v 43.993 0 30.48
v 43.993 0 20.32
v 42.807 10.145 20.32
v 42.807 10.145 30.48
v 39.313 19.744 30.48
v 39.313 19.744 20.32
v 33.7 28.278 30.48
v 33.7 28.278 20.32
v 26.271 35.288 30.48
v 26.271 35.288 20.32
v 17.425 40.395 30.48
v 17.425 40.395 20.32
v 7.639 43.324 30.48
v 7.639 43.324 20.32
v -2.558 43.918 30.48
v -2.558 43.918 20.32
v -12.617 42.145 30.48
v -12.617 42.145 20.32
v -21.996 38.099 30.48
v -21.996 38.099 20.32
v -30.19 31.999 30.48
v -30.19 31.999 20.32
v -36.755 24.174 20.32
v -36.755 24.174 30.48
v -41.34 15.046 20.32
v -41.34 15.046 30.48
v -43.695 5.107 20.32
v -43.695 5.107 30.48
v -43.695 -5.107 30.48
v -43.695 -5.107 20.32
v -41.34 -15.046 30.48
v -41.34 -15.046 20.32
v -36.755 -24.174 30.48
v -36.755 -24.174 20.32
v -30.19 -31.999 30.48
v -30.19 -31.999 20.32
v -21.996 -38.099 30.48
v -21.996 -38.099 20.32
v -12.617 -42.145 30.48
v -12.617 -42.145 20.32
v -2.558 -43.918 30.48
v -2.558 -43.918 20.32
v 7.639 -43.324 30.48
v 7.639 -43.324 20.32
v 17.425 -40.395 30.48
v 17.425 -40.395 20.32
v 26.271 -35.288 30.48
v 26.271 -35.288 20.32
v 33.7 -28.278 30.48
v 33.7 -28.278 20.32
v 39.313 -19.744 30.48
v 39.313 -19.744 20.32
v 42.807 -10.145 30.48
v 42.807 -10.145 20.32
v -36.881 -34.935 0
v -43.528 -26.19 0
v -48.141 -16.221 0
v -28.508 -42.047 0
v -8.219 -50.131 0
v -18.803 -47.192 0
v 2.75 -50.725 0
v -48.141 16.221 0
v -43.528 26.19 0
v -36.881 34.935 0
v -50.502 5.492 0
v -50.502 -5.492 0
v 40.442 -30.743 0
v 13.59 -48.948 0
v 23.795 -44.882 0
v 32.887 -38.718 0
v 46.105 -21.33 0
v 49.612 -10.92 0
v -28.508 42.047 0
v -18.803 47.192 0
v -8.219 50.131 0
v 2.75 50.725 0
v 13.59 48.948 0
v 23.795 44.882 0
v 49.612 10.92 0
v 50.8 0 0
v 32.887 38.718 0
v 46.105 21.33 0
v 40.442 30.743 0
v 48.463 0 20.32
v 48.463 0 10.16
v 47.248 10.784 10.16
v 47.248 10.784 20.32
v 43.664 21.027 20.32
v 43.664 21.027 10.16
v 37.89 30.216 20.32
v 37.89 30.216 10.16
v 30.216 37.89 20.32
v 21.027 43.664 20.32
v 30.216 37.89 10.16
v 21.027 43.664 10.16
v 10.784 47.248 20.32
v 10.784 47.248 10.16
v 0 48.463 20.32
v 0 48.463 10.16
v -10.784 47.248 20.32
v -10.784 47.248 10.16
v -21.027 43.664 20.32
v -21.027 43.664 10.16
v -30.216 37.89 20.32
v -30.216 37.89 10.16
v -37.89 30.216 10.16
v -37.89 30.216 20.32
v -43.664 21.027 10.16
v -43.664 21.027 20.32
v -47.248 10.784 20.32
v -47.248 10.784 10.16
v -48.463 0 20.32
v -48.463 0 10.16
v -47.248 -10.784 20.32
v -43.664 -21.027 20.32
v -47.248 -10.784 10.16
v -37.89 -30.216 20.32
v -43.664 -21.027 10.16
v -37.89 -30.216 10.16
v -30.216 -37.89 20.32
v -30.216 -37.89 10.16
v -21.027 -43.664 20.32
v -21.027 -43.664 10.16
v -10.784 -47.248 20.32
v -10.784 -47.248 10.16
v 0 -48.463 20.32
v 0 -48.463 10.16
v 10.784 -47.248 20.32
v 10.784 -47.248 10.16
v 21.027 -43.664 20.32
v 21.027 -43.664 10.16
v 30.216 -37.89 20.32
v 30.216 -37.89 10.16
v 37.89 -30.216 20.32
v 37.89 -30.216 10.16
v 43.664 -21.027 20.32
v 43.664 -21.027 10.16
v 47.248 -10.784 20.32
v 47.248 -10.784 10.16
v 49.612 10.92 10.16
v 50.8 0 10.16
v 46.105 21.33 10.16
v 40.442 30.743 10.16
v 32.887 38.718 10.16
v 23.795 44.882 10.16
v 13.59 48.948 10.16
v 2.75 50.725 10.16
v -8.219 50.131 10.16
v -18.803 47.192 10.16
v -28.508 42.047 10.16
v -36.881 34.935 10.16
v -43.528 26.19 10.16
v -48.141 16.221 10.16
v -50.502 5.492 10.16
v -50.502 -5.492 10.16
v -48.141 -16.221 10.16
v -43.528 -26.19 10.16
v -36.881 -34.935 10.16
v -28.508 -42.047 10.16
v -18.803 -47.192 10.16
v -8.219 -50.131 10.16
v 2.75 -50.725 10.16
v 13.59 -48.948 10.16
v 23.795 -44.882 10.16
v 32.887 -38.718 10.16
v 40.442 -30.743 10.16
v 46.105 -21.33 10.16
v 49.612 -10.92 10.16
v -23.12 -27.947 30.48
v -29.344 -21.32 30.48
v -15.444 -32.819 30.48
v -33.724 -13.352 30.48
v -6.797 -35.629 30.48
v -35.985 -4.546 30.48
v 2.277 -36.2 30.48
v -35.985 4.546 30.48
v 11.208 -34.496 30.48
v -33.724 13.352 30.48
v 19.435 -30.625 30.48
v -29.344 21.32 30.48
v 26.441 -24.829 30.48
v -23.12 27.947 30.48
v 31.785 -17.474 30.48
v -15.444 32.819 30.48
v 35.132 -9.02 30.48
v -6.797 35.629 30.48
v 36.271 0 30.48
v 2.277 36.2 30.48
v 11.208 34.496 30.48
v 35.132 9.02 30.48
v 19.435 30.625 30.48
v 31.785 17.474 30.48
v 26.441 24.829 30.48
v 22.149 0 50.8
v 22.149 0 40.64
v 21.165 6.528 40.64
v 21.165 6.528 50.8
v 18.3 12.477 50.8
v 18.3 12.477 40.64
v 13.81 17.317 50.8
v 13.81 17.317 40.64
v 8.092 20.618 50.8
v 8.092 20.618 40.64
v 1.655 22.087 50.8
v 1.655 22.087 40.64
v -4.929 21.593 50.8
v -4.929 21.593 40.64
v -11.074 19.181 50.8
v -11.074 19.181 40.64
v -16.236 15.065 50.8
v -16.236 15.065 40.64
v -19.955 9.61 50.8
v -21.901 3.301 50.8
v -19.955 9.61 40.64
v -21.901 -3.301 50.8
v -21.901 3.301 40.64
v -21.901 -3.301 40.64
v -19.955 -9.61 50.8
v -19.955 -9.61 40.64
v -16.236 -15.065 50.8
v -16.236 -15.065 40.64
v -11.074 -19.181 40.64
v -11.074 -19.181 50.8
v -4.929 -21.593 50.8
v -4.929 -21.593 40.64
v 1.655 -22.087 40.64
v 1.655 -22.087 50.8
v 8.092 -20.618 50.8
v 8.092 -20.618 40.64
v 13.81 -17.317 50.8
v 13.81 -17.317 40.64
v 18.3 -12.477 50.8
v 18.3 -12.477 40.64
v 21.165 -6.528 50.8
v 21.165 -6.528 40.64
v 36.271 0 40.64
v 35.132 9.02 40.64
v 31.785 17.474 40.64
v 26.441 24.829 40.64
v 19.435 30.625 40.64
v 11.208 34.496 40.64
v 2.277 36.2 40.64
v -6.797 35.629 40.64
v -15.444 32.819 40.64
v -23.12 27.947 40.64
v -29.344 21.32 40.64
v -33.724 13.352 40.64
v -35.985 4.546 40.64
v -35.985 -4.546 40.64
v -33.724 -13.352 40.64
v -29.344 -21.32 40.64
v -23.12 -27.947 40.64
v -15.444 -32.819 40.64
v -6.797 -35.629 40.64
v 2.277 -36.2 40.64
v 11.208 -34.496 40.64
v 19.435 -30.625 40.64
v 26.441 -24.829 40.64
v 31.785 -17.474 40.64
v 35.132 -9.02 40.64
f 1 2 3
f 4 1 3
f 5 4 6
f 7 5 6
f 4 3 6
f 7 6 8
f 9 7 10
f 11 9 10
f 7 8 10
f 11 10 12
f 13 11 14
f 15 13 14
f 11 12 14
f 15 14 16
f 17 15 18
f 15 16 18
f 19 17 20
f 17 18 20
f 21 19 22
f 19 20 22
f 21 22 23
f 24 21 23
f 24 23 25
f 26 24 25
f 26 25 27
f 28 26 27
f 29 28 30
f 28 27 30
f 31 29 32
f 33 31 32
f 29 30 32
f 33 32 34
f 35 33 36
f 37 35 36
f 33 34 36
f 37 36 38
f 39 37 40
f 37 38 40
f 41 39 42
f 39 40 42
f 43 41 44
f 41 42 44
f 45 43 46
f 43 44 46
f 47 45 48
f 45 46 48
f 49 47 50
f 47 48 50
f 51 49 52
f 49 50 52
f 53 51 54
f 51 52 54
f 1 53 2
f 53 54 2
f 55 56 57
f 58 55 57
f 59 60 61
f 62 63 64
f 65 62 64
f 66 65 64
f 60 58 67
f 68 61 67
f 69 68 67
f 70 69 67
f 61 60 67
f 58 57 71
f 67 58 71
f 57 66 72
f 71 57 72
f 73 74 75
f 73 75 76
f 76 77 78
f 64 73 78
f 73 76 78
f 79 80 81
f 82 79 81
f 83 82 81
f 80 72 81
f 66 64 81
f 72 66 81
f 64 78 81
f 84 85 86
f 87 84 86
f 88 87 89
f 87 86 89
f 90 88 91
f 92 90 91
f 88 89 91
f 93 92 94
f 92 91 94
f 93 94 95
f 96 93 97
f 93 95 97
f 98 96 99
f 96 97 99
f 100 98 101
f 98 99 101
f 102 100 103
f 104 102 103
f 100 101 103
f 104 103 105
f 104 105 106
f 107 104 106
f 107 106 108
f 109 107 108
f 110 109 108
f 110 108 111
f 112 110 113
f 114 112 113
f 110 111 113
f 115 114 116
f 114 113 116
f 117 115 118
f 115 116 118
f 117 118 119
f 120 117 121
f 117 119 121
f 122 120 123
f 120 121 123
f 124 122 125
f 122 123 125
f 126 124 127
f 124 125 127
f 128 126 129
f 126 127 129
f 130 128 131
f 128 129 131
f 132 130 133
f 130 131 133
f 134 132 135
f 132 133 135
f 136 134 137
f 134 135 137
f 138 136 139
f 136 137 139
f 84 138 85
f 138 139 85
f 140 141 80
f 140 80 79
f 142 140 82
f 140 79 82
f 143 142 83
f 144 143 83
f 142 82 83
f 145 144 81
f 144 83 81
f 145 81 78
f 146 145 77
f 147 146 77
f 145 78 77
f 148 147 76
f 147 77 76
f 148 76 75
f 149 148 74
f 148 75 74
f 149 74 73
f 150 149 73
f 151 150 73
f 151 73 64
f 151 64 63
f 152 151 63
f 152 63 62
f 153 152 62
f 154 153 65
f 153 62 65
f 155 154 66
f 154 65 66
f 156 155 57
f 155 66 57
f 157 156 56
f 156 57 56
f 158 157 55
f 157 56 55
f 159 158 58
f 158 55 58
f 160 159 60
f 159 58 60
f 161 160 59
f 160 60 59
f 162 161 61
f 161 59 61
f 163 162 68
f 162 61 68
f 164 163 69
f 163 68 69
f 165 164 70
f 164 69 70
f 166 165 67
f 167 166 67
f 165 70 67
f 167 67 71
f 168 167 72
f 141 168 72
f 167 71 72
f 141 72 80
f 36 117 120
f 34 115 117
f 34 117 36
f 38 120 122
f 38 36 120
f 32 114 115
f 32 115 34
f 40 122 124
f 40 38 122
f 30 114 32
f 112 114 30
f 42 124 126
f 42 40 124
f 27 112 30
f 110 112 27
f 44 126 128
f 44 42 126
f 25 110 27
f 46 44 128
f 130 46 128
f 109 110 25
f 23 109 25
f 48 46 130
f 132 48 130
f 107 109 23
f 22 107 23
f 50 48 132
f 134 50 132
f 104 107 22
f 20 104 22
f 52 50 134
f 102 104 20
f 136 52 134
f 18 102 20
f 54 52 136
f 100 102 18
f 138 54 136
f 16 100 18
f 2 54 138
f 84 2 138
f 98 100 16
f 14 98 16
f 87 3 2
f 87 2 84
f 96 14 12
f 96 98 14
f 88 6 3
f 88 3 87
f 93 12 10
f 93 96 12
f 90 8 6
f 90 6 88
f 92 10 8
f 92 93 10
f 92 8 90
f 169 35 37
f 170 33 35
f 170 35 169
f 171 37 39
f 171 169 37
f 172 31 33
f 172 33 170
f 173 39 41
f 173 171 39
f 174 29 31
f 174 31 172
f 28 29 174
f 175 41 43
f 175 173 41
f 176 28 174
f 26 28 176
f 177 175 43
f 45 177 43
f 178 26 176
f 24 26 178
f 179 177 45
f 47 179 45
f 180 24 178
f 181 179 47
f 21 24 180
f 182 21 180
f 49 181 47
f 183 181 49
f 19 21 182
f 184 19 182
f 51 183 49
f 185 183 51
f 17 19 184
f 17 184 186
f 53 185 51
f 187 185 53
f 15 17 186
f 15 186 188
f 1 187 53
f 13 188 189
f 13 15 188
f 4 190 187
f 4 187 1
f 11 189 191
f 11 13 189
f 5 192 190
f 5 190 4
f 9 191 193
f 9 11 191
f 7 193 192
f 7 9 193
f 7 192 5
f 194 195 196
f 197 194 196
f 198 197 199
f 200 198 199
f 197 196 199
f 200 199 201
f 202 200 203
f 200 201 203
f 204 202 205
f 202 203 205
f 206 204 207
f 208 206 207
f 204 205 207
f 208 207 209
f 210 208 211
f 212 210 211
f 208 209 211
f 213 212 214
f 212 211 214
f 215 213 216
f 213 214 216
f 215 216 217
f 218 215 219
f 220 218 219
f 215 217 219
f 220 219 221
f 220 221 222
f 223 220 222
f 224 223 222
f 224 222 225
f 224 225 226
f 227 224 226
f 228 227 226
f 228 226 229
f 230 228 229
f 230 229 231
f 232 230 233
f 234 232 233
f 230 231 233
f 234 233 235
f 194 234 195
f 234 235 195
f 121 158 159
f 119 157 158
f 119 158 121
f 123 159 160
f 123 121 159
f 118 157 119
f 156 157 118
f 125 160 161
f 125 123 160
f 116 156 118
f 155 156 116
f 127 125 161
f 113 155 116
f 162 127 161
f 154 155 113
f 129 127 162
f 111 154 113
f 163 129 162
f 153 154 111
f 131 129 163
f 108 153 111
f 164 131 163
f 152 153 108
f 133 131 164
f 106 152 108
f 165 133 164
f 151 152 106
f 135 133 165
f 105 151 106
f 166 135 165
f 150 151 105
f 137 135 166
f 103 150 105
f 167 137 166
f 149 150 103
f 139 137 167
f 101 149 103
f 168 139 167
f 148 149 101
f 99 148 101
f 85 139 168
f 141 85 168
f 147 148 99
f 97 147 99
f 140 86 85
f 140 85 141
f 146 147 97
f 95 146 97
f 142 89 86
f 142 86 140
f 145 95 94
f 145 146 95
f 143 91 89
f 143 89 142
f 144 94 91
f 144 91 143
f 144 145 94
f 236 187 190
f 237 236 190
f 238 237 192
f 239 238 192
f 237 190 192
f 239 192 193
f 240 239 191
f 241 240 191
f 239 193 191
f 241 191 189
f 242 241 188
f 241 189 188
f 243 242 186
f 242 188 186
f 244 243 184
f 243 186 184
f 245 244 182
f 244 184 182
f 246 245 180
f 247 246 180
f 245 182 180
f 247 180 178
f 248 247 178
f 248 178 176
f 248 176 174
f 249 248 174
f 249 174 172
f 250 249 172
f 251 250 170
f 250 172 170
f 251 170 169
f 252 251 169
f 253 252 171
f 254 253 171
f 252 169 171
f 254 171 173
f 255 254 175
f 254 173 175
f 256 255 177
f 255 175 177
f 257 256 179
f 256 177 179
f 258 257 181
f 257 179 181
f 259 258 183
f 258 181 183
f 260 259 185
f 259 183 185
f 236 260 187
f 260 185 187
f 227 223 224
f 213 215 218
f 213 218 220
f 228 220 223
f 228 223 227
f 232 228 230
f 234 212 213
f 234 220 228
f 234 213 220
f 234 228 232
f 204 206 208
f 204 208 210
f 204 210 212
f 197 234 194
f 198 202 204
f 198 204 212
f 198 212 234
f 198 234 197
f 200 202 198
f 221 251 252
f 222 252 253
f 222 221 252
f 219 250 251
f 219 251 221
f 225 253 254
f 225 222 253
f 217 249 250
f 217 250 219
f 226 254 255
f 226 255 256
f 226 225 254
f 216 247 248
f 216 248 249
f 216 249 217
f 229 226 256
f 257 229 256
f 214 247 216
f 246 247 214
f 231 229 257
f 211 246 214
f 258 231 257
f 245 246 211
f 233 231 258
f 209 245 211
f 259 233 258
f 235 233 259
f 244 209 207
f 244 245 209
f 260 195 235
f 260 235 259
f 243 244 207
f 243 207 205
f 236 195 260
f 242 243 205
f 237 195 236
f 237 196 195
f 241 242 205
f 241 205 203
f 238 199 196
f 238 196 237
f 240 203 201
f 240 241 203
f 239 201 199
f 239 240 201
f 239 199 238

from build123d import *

# Parameters (mm, degrees)
F0_R     = 50.8
F1_DEPTH = 10.16
F2_R     = 48.4632
F3_DEPTH = 10.16
F4_R     = 43.9928
F5_DEPTH = 10.16
F6_R     = 36.2712
F7_DEPTH = 10.16
F8_R     = 22.1488
F9_DEPTH = 10.16


with BuildPart() as f1:
    # F0 (on Top) → F1 (new body)
    with BuildSketch(Plane.XY):
        Circle(F0_R)
    extrude(amount=F1_DEPTH)

    # F2 (on face) → F3 (join)
    with BuildSketch(Plane.XY.offset(10.16)):
        Circle(F2_R)
    extrude(amount=F3_DEPTH)

    # F4 (on face) → F5 (join)
    with BuildSketch(Plane.XY.offset(20.32)):
        Circle(F4_R)
    extrude(amount=F5_DEPTH)

    # F6 (on face) → F7 (join)
    with BuildSketch(Plane.XY.offset(30.48)):
        Circle(F6_R)
    extrude(amount=F7_DEPTH)

    # F8 (on face) → F9 (join)
    with BuildSketch(Plane.XY.offset(40.64)):
        Circle(F8_R)
    extrude(amount=F9_DEPTH)


solid = f1.part
